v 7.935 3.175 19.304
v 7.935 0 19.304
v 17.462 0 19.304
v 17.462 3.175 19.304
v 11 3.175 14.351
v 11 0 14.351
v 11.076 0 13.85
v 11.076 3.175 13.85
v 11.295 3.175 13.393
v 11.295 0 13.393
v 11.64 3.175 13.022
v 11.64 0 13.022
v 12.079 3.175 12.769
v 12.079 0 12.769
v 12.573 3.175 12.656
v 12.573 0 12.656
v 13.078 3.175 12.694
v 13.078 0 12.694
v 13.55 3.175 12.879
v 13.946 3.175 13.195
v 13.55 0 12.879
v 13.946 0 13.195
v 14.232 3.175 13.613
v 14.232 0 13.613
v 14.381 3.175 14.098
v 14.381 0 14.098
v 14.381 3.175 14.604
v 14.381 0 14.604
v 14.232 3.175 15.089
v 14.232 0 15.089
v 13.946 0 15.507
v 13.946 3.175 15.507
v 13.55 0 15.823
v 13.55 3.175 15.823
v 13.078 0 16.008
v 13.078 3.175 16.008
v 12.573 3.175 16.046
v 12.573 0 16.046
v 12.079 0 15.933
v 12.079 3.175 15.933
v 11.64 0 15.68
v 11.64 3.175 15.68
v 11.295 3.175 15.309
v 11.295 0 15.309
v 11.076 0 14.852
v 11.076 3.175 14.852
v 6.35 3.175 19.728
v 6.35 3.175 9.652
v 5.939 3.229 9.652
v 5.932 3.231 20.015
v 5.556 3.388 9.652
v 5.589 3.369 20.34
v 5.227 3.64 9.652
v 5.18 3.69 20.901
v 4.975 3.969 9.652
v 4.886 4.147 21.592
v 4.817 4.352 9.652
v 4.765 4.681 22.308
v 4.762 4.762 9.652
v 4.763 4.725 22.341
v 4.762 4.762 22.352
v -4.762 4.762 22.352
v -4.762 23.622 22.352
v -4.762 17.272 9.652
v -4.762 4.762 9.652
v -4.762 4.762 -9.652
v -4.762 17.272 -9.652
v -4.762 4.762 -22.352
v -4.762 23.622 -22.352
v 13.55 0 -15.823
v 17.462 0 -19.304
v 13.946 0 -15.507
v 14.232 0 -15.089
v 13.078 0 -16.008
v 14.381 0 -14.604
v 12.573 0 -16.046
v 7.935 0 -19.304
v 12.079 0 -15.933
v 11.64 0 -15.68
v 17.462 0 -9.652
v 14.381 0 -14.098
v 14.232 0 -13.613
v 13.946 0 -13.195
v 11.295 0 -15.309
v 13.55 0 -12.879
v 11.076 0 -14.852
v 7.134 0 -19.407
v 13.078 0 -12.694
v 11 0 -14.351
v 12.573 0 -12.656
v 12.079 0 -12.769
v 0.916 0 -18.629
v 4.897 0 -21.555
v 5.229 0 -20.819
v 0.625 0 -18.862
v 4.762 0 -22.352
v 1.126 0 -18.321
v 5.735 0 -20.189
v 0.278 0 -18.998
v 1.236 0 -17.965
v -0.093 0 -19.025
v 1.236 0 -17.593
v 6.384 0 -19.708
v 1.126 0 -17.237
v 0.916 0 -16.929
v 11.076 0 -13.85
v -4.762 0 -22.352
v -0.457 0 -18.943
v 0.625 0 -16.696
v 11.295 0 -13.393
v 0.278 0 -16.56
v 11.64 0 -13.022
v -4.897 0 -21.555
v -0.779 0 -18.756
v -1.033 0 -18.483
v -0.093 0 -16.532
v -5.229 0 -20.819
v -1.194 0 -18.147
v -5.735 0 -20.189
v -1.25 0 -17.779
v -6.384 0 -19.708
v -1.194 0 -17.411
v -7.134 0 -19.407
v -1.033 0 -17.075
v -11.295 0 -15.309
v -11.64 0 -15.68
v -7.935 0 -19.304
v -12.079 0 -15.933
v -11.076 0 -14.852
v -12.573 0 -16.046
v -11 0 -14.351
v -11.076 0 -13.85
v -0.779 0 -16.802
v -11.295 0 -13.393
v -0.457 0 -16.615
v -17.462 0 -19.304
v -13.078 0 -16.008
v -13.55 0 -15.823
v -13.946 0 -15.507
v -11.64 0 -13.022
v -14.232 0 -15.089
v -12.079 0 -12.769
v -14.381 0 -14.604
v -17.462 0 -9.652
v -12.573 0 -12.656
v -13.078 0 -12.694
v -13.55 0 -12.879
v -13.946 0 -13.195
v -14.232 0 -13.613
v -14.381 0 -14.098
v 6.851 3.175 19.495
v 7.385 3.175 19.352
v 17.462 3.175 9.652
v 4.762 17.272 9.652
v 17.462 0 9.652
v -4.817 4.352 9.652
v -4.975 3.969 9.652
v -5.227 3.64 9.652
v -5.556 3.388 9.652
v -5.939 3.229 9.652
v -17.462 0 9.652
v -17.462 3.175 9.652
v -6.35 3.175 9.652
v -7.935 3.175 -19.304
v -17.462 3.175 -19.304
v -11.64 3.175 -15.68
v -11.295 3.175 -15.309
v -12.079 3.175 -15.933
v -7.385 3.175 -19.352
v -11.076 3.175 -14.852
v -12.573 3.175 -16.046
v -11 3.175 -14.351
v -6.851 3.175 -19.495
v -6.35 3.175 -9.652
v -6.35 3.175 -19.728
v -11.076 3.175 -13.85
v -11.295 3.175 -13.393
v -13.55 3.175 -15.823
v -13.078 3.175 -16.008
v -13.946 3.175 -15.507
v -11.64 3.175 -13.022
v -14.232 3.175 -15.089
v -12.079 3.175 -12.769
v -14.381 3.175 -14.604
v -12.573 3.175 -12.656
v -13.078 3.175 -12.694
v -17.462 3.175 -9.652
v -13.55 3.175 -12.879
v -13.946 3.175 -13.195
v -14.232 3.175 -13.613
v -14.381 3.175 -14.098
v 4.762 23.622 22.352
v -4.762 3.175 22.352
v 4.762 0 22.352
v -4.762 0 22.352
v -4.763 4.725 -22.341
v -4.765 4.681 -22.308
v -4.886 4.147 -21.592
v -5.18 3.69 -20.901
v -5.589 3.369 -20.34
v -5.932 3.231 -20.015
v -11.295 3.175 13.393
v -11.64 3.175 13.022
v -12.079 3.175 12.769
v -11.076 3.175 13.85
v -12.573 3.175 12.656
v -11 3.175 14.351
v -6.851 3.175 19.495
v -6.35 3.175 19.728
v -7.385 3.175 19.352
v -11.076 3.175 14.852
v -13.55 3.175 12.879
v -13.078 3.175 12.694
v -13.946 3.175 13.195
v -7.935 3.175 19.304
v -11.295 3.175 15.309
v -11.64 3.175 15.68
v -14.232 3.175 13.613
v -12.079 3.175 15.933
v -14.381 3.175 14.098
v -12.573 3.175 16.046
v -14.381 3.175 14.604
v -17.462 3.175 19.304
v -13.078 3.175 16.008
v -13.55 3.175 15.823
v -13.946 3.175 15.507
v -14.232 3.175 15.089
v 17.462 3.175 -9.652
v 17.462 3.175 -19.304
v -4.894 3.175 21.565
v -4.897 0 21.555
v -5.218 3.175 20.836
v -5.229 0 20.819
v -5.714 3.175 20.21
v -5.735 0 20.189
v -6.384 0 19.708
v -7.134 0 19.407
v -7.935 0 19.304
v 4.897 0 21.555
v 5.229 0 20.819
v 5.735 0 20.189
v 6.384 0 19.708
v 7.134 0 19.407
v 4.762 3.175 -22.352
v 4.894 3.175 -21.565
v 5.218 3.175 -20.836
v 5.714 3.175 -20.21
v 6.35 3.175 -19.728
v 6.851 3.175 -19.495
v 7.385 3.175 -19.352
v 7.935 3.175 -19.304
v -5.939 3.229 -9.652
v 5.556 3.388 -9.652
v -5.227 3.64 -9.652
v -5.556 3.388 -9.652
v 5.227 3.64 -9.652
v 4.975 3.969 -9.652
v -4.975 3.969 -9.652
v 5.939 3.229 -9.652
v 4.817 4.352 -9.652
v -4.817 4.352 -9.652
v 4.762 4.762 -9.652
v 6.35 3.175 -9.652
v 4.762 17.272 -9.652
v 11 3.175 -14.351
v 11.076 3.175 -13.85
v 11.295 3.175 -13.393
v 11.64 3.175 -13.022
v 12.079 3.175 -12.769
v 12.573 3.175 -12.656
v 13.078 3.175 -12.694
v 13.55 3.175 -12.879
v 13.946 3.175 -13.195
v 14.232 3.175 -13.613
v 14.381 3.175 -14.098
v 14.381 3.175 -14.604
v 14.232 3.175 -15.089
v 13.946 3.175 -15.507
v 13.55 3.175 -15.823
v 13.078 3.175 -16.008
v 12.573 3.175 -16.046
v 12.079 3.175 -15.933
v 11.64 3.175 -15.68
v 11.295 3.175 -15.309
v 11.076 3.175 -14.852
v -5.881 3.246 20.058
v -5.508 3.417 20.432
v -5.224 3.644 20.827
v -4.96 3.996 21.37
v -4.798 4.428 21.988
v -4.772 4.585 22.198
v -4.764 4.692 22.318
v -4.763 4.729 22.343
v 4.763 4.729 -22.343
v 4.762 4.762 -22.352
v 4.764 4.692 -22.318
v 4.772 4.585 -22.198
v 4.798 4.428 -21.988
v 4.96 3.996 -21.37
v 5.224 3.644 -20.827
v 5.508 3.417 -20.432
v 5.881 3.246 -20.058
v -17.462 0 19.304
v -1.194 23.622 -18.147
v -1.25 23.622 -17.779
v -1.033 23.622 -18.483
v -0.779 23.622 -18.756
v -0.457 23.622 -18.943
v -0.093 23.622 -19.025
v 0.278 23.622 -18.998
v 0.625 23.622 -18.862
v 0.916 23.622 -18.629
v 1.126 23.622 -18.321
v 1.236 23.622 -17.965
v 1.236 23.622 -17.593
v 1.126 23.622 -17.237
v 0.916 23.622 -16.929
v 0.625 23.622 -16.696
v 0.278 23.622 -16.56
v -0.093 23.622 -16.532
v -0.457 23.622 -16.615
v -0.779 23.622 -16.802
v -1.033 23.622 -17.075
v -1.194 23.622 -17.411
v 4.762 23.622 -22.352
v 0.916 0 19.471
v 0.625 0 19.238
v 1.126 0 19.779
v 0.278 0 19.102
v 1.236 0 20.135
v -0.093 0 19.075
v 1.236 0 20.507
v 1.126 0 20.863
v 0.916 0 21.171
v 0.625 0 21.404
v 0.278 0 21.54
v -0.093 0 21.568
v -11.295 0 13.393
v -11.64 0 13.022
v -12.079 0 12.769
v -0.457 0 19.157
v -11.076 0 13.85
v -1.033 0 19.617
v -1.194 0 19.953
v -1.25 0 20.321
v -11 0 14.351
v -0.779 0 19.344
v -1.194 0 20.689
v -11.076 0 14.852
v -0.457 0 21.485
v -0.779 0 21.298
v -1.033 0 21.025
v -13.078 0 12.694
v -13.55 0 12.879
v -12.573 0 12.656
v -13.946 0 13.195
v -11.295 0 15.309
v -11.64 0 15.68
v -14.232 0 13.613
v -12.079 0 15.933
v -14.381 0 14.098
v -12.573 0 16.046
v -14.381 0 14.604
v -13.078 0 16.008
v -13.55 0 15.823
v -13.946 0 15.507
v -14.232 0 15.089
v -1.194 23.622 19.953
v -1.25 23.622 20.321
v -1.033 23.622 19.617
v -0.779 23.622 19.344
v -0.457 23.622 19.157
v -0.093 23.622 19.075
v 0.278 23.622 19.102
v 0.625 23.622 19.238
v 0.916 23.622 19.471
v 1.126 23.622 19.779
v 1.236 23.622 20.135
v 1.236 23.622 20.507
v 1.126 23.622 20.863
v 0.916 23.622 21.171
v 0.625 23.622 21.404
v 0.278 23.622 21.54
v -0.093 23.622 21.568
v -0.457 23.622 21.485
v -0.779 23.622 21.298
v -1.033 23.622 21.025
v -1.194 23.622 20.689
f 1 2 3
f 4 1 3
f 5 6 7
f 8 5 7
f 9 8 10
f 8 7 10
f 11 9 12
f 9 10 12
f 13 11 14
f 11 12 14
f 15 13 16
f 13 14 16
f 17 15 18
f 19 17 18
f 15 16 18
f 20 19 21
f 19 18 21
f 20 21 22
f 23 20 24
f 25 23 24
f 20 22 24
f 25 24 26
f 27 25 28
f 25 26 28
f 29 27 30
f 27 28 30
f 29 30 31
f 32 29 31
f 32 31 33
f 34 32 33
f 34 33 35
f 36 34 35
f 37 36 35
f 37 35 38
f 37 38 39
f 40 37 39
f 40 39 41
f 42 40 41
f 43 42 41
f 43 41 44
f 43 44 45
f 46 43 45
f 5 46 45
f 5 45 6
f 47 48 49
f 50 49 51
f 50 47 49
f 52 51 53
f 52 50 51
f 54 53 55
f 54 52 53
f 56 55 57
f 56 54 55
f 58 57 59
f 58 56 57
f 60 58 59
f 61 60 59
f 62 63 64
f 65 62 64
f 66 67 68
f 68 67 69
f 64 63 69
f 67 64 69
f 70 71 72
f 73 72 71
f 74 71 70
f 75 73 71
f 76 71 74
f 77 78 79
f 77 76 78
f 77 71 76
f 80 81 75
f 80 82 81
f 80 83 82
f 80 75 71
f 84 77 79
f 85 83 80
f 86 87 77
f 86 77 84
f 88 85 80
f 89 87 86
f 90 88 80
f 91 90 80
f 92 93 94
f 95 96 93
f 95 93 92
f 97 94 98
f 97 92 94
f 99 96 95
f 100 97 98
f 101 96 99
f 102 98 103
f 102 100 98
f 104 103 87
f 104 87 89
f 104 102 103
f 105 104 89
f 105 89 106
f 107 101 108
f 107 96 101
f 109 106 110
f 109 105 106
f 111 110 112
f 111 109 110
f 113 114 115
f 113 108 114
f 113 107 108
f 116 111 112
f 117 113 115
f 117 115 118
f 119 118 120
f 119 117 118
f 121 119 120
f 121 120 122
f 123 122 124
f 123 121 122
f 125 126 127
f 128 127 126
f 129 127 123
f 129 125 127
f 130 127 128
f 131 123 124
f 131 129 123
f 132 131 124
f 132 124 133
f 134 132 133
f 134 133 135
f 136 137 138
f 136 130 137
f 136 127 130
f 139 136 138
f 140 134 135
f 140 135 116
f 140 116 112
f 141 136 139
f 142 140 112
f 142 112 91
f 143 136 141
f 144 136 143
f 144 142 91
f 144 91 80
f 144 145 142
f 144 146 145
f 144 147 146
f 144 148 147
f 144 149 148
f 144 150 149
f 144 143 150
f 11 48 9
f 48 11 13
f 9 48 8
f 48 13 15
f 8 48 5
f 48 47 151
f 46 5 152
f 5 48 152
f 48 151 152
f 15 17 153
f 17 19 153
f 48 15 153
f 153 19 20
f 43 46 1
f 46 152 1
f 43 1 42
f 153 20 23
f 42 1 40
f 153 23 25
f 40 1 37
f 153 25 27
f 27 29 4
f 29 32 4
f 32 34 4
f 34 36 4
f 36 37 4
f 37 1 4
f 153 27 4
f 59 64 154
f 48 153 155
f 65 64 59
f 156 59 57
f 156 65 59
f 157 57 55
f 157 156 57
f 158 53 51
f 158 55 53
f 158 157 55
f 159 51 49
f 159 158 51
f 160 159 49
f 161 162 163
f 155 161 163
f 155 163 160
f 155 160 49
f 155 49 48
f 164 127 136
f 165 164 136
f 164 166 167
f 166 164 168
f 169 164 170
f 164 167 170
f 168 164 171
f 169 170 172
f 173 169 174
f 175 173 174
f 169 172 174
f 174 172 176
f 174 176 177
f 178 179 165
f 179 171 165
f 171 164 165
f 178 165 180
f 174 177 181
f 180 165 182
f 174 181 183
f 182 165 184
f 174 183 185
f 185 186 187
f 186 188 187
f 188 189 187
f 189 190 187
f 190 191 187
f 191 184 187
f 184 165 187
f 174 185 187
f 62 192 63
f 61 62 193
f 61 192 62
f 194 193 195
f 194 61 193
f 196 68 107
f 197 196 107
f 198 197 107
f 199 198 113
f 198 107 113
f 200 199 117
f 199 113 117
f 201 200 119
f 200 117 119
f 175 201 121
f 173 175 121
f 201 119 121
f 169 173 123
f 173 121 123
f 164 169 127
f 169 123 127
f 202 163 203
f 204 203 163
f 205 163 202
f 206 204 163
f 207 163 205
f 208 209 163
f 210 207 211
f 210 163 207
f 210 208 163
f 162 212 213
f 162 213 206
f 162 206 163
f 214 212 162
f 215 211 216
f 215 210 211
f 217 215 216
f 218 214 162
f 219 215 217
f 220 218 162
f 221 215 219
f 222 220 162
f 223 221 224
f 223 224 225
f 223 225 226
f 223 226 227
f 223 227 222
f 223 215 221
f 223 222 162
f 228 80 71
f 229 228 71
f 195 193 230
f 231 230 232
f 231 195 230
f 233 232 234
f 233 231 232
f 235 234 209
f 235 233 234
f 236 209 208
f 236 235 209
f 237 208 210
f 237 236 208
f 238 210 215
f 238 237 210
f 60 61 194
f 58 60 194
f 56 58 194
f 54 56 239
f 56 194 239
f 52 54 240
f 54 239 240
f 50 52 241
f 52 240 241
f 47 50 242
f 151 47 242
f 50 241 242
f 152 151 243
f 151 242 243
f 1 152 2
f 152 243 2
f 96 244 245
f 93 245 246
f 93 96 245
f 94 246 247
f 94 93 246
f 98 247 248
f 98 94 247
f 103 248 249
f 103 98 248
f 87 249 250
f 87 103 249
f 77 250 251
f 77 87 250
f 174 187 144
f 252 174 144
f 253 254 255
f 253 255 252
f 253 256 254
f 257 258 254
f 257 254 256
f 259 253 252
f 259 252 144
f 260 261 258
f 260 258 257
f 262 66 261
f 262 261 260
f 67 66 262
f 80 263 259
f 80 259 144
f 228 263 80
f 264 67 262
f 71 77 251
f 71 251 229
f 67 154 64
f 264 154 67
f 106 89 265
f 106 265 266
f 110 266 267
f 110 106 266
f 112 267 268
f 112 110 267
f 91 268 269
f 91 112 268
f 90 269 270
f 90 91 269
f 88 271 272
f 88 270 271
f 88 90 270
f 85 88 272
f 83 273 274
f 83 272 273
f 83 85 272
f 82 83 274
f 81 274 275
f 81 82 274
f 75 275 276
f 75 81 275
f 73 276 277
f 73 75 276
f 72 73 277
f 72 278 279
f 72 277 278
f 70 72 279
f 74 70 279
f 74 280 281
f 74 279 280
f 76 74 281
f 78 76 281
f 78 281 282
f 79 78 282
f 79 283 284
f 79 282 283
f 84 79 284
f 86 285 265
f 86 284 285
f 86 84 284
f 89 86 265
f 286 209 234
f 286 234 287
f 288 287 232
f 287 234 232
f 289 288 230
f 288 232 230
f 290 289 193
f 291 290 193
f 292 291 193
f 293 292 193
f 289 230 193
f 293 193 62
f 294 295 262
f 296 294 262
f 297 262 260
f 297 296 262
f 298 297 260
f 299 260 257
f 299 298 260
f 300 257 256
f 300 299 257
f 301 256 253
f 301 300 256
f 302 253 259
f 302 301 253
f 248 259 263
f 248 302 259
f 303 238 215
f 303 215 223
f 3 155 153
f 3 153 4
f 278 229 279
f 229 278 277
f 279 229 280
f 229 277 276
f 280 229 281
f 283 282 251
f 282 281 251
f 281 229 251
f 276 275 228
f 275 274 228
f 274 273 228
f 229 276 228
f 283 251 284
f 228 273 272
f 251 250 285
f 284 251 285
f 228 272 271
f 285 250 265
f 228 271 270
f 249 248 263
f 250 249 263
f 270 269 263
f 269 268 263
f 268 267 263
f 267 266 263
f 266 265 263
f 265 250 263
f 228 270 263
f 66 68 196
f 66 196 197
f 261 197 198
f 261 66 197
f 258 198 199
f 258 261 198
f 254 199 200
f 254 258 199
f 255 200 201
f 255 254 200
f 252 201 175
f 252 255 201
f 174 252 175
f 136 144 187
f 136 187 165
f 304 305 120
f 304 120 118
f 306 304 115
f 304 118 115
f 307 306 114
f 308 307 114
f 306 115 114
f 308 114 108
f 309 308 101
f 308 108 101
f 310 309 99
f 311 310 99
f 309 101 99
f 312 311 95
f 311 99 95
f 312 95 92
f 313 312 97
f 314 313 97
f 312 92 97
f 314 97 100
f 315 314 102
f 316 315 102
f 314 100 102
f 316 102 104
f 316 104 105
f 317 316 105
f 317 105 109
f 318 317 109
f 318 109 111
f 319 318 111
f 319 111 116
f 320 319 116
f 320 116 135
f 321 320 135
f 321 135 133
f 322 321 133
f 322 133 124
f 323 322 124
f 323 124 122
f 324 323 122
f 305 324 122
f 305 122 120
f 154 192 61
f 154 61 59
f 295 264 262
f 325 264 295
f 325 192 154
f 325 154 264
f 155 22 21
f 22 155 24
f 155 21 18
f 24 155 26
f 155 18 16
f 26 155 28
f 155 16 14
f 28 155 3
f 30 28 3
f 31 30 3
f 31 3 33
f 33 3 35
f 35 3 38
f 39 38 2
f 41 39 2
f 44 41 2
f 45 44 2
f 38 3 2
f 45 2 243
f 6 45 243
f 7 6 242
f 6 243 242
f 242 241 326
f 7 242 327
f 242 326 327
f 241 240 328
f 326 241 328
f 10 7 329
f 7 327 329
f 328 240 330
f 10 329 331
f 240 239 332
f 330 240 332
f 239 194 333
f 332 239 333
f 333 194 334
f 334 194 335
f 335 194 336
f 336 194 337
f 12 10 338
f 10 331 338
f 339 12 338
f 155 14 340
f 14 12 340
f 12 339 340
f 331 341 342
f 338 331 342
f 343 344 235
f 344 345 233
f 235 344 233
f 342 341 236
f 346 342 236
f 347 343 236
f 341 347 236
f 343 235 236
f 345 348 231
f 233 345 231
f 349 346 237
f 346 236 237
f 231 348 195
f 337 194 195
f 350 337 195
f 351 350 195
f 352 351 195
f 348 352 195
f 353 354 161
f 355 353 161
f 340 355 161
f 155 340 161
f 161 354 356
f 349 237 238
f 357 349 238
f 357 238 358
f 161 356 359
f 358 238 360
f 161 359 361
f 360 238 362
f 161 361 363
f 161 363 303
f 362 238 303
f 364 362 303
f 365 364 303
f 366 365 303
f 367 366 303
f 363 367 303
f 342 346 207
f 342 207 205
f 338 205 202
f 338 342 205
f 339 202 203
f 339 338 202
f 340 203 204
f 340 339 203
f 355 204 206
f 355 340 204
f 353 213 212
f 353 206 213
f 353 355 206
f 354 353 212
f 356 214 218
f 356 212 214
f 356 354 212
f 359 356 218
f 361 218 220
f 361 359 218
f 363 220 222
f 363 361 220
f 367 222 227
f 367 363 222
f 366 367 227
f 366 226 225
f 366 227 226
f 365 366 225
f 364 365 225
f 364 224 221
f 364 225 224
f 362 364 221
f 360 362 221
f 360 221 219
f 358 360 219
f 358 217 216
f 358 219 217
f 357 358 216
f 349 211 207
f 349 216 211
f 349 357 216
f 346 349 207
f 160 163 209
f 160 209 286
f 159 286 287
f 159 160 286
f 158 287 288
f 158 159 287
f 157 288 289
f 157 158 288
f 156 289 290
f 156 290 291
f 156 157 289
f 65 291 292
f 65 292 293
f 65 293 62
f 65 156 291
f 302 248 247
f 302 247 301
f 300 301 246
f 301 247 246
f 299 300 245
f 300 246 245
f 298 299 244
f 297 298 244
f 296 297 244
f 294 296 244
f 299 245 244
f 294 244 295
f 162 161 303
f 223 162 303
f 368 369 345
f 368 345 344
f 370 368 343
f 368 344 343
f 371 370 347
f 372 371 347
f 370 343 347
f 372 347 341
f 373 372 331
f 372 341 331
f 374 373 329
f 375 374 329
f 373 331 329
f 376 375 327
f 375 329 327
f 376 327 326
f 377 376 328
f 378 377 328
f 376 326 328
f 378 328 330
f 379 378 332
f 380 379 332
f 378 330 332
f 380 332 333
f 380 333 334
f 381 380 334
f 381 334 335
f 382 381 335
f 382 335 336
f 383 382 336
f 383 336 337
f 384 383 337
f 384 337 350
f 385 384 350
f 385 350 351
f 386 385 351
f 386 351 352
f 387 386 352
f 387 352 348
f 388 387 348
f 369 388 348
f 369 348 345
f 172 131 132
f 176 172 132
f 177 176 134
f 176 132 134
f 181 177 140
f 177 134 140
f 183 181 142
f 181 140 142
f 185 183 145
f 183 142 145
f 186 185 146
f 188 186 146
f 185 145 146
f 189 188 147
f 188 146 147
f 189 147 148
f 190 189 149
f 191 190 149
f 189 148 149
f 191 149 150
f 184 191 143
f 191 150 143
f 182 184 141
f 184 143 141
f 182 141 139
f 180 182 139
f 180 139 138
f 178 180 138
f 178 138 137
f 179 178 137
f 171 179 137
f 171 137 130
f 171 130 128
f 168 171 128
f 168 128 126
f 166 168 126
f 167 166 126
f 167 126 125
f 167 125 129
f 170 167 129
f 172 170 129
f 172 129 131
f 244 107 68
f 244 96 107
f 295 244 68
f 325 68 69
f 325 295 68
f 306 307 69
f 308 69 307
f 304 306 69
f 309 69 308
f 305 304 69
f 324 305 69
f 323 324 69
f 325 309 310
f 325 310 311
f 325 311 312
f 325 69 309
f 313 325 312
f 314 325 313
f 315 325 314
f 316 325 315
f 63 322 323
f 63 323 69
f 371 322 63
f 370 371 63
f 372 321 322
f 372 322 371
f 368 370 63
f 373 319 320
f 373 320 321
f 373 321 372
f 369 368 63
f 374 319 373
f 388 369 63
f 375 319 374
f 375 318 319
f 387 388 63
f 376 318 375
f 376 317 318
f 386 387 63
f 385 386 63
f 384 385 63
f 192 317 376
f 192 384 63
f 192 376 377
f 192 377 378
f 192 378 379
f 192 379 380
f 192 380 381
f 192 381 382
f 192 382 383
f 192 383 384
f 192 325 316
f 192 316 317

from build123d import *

# Parameters (mm, degrees)
BOSS_EXTRUDE1_DEPTH         = 4.7625
SKETCH4_W                   = 12.7
SKETCH4_H                   = 9.652
BOSS_EXTRUDE2_DEPTH         = 3.175
M3_CLEARANCE_HOLE1_D        = 3.4
MIRROR2_COPY_1_SKETCH_W     = 12.7
MIRROR2_COPY_1_SKETCH_H     = 9.652
MIRROR2_COPY_1_DEPTH        = 3.175
MIRROR2_COPY_2_D            = 3.4
FILLET1_R                   = 3.175
FILLET2_R                   = 1.5875
TAP_DRILL_FOR_M3X0_5_TAP1_D = 2.5


with BuildPart() as part:
    # Sketch2 → Boss-Extrude1 (new, symmetric)
    with BuildSketch(Plane(origin=(0, 0, 0), x_dir=(0, 0, -1), z_dir=(1, 0, 0))):
        Polygon((22.352, 23.622), (-22.352, 23.622), (-22.352, 0), (-9.652, 0), (-9.652, 17.272), (9.652, 17.272), (9.652, 0), (22.352, 0), align=None)
    extrude(amount=BOSS_EXTRUDE1_DEPTH, both=True)

    # Sketch4 → Boss-Extrude2 (add)
    with BuildSketch(Plane.XZ):
        with Locations((11.1125, 14.478)):
            Rectangle(SKETCH4_W, SKETCH4_H)
    boss_extrude2 = extrude(amount=-BOSS_EXTRUDE2_DEPTH)

    # M3 Clearance Hole1 (through all)
    with Locations(Plane(origin=(0, 3.175, 0), x_dir=(1, 0, 0), z_dir=(0, 1, 0))):
        with Locations((12.7, -14.351)):
            m3_clearance_hole1 = Hole(M3_CLEARANCE_HOLE1_D / 2)

    # Mirror1: Boss-Extrude2, M3 Clearance Hole1 across plane
    add(boss_extrude2.mirror(Plane.XY))
    add(m3_clearance_hole1.mirror(Plane.XY), mode=Mode.SUBTRACT)

    # Mirror2: Boss-Extrude2, M3 Clearance Hole1 across plane
    add(boss_extrude2.mirror(Plane(origin=(0, 0, 0), x_dir=(0, 0, 1), z_dir=(1, 0, 0))))
    add(m3_clearance_hole1.mirror(Plane(origin=(0, 0, 0), x_dir=(0, 0, 1), z_dir=(1, 0, 0))), mode=Mode.SUBTRACT)

    # Mirror2 copy 1 sketch → Mirror2 copy 1 (add)
    with BuildSketch(Plane(origin=(0, 0, 0), x_dir=(-1, 0, 0), z_dir=(0, -1, 0))):
        with Locations((11.1125, 14.478)):
            Rectangle(MIRROR2_COPY_1_SKETCH_W, MIRROR2_COPY_1_SKETCH_H)
    extrude(amount=-MIRROR2_COPY_1_DEPTH)

    # Mirror2 copy 2 (through all)
    with Locations(Plane(origin=(0, 3.175, 0), x_dir=(-1, 0, 0), z_dir=(0, 1, 0))):
        with Locations((12.7, -14.351)):
            Hole(MIRROR2_COPY_2_D / 2)

    # Fillet1
    # the kernel refuses this fillet: 3.175 mm, written as the material it adds along each edge
    with BuildSketch(Plane(origin=(-4.7625, 0, -19.304), x_dir=(0, 0, -1), z_dir=(0, 1, 0)), Plane(origin=(4.7625, 0, 19.304), x_dir=(0, 0, 1), z_dir=(0, 1, 0))) as fillet1_piece_1:
        with BuildLine():
            CenterArc((3.175, 3.172458983), FILLET1_R, 180, 87.707557224)
            Line((0, 3.172458983), (-0.0635, 3.172458983))
            Line((-0.0635, 3.172458983), (-0.0635, 0))
            Line((-0.0635, 0), (0, -0.0635))
            ThreePointArc((0, -0.0635), (1.524, -0.0635), (3.04546, -0.06344918))
            Line((3.04546, -0.06344918), (3.048, 0))
        make_face()
    extrude(amount=3.175)
    with BuildSketch(Plane(origin=(4.7625, 0, -19.304), x_dir=(0, 0, -1), z_dir=(0, 1, 0)), Plane(origin=(-4.7625, 0, 19.304), x_dir=(0, 0, 1), z_dir=(0, 1, 0))) as fillet1_piece_2:
        with BuildLine():
            CenterArc((3.175, -3.172458983), FILLET1_R, 92.292442776, 87.707557224)
            Line((0, -3.172458983), (-0.0635, -3.172458983))
            Line((-0.0635, -3.172458983), (-0.0635, 0))
            Line((-0.0635, 0), (0, 0.0635))
            ThreePointArc((0, 0.0635), (1.524, 0.0635), (3.04546, 0.06344918))
            Line((3.04546, 0.06344918), (3.048, 0))
        make_face()
    extrude(amount=3.175)

    # Fillet2
    # the kernel refuses this fillet: 1.5875 mm, written as the material it adds along each edge
    with BuildSketch(Plane(origin=(4.7625, 3.175, 22.352), x_dir=(1, 0, 0), z_dir=(0, 0, -1))) as fillet2_piece_1_section:
        with BuildLine():
            CenterArc((FILLET2_R, -FILLET2_R), FILLET2_R, 90, 90)
            Line((0, -FILLET2_R), (0, 0))
            Line((0, 0), (FILLET2_R, 0))
        make_face()
    fillet2_piece_1 = extrude(amount=12.7, mode=Mode.PRIVATE)
    fillet2_piece_1 = fillet2_piece_1 - Plane(origin=(7.934958983, 3.539048881, 22.479), x_dir=(0, 0, 1), z_dir=(0, -1, 0)) * Cylinder(3.175, 32, mode=Mode.PRIVATE)
    add(fillet2_piece_1)
    with BuildSketch(Plane(origin=(4.7625, 3.175, -22.352), x_dir=(1, 0, 0), z_dir=(0, 0, 1))) as fillet2_piece_2_section:
        with BuildLine():
            CenterArc((FILLET2_R, FILLET2_R), FILLET2_R, 180, 90)
            Line((0, FILLET2_R), (0, 0))
            Line((0, 0), (FILLET2_R, 0))
        make_face()
    fillet2_piece_2 = extrude(amount=12.7, mode=Mode.PRIVATE)
    fillet2_piece_2 = fillet2_piece_2 - Plane(origin=(7.934958983, 3.539054825, -22.479), x_dir=(0, 0, -1), z_dir=(0, -1, 0)) * Cylinder(3.175, 32, mode=Mode.PRIVATE)
    add(fillet2_piece_2)
    with BuildSketch(Plane(origin=(-4.7625, 3.175, 9.652), x_dir=(0, 1, 0), z_dir=(0, 0, 1))) as fillet2_piece_3_section:
        with BuildLine():
            CenterArc((FILLET2_R, FILLET2_R), FILLET2_R, 180, 90)
            Line((0, FILLET2_R), (0, 0))
            Line((0, 0), (FILLET2_R, 0))
        make_face()
    fillet2_piece_3 = extrude(amount=12.7, mode=Mode.PRIVATE)
    fillet2_piece_3 = fillet2_piece_3 - Plane(origin=(-7.934958983, 3.539056273, 22.479), x_dir=(0, 0, 1), z_dir=(0, -1, 0)) * Cylinder(3.175, 32, mode=Mode.PRIVATE)
    add(fillet2_piece_3)
    with BuildSketch(Plane(origin=(-4.7625, 3.175, -9.652), x_dir=(-1, 0, 0), z_dir=(0, 0, -1))) as fillet2_piece_4_section:
        with BuildLine():
            CenterArc((FILLET2_R, FILLET2_R), FILLET2_R, 180, 90)
            Line((0, FILLET2_R), (0, 0))
            Line((0, 0), (FILLET2_R, 0))
        make_face()
    fillet2_piece_4 = extrude(amount=12.7, mode=Mode.PRIVATE)
    fillet2_piece_4 = fillet2_piece_4 - Plane(origin=(-7.934958983, 3.539048881, -22.479), x_dir=(0, 0, -1), z_dir=(0, -1, 0)) * Cylinder(3.175, 32, mode=Mode.PRIVATE)
    add(fillet2_piece_4)

    # Tap Drill for M3x0.5 Tap1 (through all)
    with Locations(Plane(origin=(0, 23.622, 0), x_dir=(1, 0, 0), z_dir=(0, 1, 0))):
        with Locations((0, 17.778984556), (0, -20.321015444)):
            Hole(TAP_DRILL_FOR_M3X0_5_TAP1_D / 2)


solid = part.part
